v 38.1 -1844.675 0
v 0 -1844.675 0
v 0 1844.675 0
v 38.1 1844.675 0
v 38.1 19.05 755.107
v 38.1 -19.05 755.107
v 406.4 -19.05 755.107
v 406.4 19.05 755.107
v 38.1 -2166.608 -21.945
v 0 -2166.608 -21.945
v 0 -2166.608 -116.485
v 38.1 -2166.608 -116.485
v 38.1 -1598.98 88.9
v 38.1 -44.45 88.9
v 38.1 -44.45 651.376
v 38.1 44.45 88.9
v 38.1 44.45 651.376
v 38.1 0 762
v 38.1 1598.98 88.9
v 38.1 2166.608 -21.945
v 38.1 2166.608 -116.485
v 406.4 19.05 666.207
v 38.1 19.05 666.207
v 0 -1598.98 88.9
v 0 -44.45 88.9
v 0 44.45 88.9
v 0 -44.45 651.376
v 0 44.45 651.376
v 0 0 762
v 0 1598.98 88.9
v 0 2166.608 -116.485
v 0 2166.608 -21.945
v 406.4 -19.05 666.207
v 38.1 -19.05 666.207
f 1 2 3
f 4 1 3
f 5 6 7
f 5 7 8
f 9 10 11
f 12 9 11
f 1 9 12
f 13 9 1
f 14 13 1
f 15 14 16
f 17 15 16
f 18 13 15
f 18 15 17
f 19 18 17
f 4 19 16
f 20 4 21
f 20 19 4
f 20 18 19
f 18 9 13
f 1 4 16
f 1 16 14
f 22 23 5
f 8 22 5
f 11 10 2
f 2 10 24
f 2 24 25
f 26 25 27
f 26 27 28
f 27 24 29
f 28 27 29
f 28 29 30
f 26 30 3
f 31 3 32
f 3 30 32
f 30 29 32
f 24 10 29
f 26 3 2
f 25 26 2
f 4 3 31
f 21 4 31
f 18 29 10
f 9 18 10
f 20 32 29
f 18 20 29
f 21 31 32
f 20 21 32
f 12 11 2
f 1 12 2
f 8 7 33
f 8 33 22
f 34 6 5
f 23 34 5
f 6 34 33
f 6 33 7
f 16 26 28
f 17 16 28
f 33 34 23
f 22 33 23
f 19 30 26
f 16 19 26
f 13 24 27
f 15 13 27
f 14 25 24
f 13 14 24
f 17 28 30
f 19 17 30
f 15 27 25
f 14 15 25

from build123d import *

# Parameters (mm, degrees)
F1_DEPTH = 38.1
F2_W     = 38.1
F2_H     = 88.9
F3_DEPTH = 368.3


with BuildPart() as f1:
    # F0 (on Right) → F1 (new body)
    with BuildSketch(Plane.YZ):
        Polygon((1598.979778, 88.9), (1844.675, 0), (2166.60807, -116.485171), (2166.60807, -21.944661), (0, 762), (0, 667.45949), (44.45, 651.376129), align=None)
        Polygon((-2166.60807, -116.485171), (-1844.675, 0), (-1598.979778, 88.9), (-44.45, 651.376129), (0, 667.45949), (0, 762), (-2166.60807, -21.944661), align=None)
        Polygon((0, 667.45949), (-44.45, 651.376129), (-44.45, 88.9), (44.45, 88.9), (44.45, 651.376129), align=None)
        Polygon((-1598.979778, 88.9), (-1844.675, 0), (1844.675, 0), (1598.979778, 88.9), (44.45, 88.9), (-44.45, 88.9), align=None)
    extrude(amount=F1_DEPTH)


with BuildPart() as f3:
    # F2 (on face) → F3 (new body)
    with BuildSketch(Plane.YZ.offset(38.1)):
        with Locations((0, 710.657131)):
            Rectangle(F2_W, F2_H)
    extrude(amount=F3_DEPTH)


solid = Compound([f1.part, f3.part])
